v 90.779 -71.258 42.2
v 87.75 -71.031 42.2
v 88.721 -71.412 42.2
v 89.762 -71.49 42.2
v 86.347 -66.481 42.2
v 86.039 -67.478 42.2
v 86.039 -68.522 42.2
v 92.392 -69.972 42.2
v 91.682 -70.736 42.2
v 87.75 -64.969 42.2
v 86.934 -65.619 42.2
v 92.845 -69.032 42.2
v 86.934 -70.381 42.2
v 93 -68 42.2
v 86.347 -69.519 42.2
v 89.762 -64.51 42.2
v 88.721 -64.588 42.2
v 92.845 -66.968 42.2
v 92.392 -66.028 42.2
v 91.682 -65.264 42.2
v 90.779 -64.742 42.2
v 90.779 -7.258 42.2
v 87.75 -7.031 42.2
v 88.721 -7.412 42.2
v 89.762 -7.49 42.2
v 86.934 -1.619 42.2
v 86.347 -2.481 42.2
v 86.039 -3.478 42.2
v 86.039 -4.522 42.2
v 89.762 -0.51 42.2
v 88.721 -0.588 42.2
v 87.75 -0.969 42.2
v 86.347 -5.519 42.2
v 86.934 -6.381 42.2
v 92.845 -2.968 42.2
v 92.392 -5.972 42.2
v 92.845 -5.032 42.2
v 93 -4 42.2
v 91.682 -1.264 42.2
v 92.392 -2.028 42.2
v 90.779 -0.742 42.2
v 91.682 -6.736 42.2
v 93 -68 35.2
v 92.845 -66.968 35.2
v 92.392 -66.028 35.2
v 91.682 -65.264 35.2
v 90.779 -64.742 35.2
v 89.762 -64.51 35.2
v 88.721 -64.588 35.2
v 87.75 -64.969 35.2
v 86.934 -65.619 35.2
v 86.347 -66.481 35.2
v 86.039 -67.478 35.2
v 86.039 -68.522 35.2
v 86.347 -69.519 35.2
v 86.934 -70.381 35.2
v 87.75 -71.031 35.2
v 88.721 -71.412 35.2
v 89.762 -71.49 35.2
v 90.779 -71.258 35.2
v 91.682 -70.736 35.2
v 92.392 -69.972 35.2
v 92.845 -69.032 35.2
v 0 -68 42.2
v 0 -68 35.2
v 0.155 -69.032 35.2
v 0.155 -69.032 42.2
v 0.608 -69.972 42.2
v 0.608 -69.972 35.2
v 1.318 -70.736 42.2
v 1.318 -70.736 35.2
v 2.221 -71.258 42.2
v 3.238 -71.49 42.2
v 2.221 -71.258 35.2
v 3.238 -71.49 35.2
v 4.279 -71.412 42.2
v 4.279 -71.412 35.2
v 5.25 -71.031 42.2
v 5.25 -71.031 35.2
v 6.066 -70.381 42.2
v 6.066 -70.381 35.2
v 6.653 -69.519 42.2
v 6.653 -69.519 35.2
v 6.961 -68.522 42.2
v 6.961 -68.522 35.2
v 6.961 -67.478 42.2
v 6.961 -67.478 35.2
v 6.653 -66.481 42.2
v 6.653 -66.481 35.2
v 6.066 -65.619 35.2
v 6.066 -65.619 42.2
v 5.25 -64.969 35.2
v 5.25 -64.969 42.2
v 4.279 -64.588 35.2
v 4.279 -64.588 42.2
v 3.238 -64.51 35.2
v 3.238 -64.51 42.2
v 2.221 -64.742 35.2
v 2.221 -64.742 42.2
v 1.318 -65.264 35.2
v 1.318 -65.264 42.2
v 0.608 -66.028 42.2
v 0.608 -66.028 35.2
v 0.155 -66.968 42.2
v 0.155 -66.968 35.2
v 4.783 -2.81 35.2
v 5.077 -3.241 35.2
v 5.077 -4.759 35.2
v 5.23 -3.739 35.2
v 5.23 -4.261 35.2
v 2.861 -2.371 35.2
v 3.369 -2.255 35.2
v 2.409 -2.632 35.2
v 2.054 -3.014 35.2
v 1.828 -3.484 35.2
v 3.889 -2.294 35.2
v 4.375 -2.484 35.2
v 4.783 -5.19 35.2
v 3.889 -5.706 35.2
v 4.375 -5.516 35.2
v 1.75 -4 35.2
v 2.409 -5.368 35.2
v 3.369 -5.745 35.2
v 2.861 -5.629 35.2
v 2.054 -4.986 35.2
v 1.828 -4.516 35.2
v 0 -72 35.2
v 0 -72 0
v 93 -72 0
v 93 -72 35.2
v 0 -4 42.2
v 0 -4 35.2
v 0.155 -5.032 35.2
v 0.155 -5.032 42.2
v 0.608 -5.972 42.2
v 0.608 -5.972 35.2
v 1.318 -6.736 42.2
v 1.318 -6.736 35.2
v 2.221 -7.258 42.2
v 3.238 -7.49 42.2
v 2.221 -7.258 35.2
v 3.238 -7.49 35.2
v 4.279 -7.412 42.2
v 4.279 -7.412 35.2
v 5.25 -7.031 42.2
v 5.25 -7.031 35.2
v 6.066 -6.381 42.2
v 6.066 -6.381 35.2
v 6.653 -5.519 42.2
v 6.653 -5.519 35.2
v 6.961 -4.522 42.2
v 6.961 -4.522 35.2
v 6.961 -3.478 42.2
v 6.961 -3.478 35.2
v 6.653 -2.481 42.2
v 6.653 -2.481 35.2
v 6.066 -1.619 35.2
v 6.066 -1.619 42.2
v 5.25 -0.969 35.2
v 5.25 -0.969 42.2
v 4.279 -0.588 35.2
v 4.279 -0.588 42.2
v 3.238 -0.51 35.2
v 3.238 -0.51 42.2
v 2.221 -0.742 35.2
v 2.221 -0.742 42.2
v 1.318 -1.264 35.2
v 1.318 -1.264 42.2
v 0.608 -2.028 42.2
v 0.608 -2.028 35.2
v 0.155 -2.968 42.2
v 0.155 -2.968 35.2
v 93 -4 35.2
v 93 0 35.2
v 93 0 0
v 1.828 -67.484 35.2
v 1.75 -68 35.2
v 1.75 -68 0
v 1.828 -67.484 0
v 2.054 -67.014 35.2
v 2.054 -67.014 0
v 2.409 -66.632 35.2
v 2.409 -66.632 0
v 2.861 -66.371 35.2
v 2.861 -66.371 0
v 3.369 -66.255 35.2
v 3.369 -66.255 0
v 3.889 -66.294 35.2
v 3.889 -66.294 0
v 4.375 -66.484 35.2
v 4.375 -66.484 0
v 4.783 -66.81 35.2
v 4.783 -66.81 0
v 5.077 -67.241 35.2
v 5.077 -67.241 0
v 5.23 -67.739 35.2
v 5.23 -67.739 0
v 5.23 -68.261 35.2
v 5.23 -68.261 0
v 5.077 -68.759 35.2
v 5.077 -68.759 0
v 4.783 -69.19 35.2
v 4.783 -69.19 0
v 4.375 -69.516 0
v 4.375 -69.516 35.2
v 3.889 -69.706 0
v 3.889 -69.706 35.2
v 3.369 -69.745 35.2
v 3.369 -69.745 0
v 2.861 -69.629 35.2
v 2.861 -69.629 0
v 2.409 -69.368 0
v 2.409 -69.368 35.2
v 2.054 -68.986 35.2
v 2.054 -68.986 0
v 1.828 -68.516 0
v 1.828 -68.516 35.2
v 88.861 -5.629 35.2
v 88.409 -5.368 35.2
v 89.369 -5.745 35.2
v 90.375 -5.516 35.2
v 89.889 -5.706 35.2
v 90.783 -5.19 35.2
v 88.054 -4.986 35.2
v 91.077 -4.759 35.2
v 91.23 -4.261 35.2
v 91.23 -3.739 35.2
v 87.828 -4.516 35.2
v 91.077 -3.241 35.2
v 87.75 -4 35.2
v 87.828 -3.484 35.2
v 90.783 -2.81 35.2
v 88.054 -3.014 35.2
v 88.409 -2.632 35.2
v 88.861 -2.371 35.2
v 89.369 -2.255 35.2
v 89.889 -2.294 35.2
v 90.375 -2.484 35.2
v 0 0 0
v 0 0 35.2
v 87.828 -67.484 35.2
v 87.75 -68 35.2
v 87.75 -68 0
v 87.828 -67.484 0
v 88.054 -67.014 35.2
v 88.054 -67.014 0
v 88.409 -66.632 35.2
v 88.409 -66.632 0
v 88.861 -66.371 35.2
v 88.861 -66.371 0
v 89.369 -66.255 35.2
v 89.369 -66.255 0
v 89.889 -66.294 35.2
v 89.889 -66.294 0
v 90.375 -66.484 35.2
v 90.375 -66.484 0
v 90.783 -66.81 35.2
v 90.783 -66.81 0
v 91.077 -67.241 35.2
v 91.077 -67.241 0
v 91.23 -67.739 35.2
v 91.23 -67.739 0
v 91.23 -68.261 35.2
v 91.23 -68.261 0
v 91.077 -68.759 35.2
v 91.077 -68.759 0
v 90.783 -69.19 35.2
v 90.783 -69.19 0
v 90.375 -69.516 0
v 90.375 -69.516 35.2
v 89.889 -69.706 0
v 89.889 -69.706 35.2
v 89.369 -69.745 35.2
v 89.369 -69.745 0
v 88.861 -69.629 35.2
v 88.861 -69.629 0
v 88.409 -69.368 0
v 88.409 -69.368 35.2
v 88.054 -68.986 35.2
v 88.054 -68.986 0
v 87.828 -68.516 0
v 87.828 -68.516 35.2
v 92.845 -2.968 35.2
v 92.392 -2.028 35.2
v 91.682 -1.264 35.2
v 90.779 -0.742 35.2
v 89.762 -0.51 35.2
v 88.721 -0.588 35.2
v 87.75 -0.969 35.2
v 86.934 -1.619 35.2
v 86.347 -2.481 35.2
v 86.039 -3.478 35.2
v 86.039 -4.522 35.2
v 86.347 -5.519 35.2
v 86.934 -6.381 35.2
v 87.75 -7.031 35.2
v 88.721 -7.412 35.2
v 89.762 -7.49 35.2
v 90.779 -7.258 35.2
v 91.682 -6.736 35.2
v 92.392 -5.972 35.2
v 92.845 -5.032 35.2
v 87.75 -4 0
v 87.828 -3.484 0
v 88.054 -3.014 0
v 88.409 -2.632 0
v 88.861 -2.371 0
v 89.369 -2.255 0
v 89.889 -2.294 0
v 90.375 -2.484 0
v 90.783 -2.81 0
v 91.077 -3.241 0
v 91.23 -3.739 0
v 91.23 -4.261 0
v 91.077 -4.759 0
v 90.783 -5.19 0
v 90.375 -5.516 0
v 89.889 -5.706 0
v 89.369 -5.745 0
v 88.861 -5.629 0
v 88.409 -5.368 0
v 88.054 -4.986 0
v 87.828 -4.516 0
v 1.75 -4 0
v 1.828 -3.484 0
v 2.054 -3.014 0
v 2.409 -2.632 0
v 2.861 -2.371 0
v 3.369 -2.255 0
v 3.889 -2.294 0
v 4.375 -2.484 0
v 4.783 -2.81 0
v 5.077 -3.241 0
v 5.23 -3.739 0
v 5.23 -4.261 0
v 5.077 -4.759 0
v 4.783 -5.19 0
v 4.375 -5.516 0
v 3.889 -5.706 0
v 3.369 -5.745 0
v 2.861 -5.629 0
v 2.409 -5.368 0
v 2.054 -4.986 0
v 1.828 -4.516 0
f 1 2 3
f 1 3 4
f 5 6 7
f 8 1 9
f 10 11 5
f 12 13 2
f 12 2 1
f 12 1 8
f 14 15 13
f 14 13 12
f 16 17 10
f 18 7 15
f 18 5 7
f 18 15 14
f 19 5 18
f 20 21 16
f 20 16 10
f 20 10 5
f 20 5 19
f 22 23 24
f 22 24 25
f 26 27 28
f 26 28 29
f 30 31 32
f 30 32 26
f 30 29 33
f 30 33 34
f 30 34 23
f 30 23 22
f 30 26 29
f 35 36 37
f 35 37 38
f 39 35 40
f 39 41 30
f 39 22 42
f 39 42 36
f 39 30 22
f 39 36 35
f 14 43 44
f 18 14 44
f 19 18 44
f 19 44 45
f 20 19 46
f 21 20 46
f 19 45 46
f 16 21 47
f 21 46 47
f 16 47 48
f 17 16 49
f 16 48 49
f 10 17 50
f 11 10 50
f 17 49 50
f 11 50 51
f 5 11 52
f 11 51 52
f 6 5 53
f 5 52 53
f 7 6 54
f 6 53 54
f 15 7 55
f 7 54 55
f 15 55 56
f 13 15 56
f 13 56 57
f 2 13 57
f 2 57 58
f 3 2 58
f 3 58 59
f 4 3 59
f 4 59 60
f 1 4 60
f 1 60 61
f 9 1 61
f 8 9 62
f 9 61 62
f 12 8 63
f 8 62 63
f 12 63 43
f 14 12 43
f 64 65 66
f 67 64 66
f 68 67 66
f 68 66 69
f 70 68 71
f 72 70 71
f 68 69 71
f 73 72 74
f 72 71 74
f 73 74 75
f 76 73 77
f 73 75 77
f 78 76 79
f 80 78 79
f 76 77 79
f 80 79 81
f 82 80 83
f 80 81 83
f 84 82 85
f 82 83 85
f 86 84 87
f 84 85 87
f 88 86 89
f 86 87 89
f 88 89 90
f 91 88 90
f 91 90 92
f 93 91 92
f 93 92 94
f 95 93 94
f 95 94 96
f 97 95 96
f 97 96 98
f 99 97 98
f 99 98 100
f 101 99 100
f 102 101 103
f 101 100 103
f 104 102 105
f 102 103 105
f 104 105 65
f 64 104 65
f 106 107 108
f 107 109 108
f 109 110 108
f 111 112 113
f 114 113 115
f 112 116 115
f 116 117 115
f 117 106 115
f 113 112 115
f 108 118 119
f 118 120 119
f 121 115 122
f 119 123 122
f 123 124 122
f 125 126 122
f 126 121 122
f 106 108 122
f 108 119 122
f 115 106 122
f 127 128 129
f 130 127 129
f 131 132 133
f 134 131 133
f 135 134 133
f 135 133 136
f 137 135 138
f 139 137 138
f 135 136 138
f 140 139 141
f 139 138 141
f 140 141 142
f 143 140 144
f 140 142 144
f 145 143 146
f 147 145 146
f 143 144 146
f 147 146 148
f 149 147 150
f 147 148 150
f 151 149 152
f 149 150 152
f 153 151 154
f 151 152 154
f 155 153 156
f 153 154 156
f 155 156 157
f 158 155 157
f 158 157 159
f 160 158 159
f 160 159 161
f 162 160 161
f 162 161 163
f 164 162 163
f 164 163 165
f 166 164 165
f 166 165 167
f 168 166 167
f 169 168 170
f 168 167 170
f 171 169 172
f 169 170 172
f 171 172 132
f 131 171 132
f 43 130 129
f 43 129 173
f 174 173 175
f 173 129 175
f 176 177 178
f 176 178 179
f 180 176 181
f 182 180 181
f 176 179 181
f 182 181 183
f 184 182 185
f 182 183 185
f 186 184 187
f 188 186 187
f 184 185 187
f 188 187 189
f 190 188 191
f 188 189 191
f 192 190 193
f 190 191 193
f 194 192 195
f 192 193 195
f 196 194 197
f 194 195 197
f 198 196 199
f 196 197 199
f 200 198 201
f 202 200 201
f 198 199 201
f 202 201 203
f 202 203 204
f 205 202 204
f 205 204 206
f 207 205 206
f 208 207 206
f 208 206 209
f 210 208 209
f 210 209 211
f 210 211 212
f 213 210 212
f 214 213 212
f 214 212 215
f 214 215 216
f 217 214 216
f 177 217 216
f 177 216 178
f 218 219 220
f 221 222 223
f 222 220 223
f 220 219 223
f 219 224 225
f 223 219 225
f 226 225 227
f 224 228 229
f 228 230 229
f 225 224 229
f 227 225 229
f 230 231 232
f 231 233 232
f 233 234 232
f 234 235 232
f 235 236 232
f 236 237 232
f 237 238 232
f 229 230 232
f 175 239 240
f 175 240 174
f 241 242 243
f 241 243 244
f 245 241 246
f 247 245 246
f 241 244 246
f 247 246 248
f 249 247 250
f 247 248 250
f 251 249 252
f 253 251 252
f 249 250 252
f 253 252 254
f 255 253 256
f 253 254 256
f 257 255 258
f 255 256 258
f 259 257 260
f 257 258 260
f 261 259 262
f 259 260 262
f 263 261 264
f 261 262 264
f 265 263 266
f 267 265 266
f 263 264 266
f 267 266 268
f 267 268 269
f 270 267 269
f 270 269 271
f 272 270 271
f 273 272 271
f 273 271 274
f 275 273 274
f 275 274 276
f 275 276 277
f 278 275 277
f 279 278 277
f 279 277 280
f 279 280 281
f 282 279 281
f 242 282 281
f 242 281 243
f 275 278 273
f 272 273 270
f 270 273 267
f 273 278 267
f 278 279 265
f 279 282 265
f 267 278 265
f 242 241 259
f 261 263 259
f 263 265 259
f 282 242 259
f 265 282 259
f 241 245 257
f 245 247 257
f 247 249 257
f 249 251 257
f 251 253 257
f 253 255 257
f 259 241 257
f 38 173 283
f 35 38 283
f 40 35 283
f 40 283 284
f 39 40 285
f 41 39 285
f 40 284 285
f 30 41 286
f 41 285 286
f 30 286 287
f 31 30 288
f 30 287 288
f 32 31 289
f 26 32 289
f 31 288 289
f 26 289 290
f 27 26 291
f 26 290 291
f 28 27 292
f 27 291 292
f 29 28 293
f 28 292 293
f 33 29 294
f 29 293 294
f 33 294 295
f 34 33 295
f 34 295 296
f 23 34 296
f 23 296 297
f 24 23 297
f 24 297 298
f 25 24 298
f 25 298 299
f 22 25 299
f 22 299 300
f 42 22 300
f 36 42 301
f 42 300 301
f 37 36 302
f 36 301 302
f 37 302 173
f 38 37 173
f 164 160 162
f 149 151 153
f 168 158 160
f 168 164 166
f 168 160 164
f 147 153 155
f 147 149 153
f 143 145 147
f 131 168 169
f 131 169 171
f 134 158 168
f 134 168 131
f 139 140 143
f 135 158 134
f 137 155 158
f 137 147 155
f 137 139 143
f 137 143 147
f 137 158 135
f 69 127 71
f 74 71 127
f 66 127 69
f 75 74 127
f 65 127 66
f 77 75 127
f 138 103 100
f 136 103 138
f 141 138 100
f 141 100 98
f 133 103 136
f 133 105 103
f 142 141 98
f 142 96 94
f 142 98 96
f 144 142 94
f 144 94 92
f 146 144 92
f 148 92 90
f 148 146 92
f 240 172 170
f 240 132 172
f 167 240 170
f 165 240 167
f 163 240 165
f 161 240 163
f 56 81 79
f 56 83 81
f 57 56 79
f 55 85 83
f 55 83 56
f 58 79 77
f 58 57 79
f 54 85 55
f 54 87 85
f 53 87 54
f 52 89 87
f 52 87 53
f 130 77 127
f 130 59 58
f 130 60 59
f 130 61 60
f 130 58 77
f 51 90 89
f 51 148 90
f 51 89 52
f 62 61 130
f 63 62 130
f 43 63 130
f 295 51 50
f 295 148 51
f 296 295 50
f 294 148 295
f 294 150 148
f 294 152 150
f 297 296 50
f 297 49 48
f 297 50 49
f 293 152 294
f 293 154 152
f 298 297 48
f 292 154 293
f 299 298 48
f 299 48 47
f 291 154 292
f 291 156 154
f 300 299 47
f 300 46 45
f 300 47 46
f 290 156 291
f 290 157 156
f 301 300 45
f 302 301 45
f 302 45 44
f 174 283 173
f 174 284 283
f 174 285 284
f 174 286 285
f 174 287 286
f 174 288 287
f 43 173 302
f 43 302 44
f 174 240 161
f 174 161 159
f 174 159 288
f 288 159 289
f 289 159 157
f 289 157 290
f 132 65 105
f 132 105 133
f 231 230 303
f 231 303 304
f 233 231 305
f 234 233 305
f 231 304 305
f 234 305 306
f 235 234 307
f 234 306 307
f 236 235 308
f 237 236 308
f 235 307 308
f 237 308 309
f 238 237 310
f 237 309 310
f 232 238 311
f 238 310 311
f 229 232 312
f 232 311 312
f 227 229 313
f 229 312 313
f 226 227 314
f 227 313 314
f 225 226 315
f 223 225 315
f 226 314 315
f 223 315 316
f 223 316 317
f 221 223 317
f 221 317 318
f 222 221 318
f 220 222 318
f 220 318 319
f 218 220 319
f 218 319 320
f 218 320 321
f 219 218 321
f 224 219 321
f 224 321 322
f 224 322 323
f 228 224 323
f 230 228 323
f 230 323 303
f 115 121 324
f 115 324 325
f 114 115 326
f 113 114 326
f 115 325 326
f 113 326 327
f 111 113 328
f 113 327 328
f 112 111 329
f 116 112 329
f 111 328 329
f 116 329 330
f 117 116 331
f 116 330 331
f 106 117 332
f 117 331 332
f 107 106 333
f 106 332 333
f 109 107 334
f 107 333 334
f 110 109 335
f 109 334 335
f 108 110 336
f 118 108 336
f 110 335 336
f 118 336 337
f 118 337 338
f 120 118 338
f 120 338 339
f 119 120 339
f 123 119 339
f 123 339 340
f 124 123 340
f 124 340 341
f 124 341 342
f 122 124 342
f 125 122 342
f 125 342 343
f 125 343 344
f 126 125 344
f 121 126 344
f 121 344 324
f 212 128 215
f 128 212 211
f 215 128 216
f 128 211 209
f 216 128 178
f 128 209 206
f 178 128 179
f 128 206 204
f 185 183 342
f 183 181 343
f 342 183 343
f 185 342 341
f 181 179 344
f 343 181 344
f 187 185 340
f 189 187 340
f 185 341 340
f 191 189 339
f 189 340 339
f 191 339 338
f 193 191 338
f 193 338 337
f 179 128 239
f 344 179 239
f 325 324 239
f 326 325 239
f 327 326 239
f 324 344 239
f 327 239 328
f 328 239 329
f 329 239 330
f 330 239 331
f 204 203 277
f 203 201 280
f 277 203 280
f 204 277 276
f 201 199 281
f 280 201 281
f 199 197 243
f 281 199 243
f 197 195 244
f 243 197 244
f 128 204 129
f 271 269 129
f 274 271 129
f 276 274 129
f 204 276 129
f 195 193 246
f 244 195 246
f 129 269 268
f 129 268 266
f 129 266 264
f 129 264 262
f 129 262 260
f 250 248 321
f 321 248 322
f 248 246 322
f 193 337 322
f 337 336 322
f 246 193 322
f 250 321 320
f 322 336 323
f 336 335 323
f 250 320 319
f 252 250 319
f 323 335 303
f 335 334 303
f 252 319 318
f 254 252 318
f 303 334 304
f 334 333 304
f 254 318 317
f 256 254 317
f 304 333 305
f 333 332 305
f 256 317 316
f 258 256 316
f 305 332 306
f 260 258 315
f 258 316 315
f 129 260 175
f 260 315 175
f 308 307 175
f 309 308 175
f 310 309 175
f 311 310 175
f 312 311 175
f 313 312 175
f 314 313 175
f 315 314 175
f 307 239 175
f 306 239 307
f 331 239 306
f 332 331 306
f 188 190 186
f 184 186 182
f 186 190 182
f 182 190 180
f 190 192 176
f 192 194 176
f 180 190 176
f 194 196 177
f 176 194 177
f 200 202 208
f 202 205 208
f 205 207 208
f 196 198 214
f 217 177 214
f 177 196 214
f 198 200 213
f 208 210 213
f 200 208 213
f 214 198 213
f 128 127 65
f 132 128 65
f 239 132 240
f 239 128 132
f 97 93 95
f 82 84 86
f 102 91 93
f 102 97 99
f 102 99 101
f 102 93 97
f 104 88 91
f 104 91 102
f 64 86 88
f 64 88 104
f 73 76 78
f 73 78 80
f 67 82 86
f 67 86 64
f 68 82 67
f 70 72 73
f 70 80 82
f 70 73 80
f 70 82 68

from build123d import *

# Parameters (mm, degrees)
ESQUISSE1_W             = 93
ESQUISSE1_H             = 72
BOSS_EXTRU_1_DEPTH      = 35.2
ESQUISSE2_R             = 1.75
ENL_V_MAT_EXTRU_1_DEPTH = 123.768236934
ESQUISSE3_R             = 3.5
BOSS_EXTRU_2_DEPTH      = 7


with BuildPart() as part:
    # Esquisse1 → Boss.-Extru.1 (new body)
    with BuildSketch(Plane.XY):
        with Locations((46.5, -36)):
            Rectangle(ESQUISSE1_W, ESQUISSE1_H)
    extrude(amount=BOSS_EXTRU_1_DEPTH)

    # Esquisse2 → Enlèv. mat.-Extru.1 (cut, through all)
    with BuildSketch(Plane(origin=(0, 0, 0), x_dir=(-1, 0, 0), z_dir=(0, 0, -1))):
        with Locations((-89.5, -4)):
            Circle(ESQUISSE2_R)
        with Locations((-3.5, -4)):
            Circle(ESQUISSE2_R)
        with Locations((-89.5, -68)):
            Circle(ESQUISSE2_R)
        with Locations((-3.5, -68)):
            Circle(ESQUISSE2_R)
    extrude(amount=-ENL_V_MAT_EXTRU_1_DEPTH, mode=Mode.SUBTRACT)

    # Esquisse3 → Boss.-Extru.2 (add)
    with BuildSketch(Plane.XY.offset(35.2)):
        with Locations((89.5, -68)):
            Circle(ESQUISSE3_R)
        with Locations(Location((3.5, -68, 0), (0, 0, 180))):
            Circle(ESQUISSE3_R)
        with Locations((89.5, -4)):
            Circle(ESQUISSE3_R)
        with Locations(Location((3.5, -4, 0), (0, 0, 180))):
            Circle(ESQUISSE3_R)
    extrude(amount=BOSS_EXTRU_2_DEPTH)


solid = part.part
